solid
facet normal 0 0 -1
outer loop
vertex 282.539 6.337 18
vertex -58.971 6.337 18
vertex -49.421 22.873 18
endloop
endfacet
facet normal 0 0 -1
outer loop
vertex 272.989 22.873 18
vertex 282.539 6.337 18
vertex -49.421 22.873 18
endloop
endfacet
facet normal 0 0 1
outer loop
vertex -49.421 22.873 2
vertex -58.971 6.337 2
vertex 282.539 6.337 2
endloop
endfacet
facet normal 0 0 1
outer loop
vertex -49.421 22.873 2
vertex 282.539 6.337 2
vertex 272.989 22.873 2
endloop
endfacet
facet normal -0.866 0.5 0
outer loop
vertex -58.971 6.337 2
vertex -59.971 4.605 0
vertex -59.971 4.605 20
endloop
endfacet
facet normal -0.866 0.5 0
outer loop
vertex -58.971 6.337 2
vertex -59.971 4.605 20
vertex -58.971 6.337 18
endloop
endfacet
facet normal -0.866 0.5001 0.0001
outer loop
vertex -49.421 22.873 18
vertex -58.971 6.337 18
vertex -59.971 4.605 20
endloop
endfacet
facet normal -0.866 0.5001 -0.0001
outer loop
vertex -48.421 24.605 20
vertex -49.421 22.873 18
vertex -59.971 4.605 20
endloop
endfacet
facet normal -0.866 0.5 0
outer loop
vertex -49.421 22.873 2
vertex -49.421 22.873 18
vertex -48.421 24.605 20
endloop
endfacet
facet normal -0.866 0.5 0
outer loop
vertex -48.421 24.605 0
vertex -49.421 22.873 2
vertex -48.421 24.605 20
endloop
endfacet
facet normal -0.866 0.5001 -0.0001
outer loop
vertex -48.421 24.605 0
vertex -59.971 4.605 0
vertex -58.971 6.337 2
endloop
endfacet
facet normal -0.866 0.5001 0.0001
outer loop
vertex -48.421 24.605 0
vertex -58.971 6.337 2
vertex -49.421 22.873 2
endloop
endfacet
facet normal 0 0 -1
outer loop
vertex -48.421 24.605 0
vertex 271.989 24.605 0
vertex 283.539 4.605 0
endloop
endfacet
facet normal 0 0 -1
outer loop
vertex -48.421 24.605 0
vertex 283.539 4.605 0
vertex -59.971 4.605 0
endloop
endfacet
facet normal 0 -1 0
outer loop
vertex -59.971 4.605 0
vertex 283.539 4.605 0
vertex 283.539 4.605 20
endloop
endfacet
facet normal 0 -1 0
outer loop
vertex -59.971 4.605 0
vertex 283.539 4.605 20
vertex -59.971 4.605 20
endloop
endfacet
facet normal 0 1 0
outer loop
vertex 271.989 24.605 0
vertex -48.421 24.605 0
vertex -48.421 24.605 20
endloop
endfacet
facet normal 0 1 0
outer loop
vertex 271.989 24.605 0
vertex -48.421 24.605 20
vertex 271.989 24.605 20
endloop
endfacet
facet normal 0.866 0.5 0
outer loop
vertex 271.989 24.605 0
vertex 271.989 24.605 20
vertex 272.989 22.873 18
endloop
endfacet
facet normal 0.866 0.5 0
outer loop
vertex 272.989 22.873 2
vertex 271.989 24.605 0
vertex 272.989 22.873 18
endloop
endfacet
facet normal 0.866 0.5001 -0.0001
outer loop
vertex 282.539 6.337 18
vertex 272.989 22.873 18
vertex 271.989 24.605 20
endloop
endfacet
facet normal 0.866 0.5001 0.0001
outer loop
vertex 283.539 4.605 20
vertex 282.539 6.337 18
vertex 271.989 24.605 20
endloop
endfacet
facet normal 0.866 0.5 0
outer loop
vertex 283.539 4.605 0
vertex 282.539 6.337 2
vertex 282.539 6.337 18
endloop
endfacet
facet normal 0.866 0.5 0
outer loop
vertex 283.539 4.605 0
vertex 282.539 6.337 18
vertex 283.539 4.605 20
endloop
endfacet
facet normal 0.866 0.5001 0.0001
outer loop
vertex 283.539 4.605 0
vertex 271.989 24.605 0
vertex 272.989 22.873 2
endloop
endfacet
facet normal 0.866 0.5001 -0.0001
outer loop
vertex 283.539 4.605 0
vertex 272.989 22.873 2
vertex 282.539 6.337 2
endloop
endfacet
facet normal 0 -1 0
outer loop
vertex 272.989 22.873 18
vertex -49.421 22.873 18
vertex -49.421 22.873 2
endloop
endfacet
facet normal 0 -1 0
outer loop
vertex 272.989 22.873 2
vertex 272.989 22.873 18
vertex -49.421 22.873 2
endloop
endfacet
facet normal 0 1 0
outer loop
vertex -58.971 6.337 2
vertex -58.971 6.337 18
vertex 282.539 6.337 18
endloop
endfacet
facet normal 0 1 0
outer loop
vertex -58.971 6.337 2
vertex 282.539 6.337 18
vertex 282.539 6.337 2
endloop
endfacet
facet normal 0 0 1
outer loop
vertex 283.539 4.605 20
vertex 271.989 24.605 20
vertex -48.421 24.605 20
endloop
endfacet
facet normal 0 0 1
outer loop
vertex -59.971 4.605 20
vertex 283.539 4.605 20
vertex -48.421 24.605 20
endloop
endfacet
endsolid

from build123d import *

# Parameters (mm, degrees)
BOSS_EXTRUDE1_DEPTH     = 20
CUT_EXTRUDE1_DEPTH      = 286.306420625
CUT_EXTRUDE1_DEPTH_BACK = 286.306420625
SKETCH3_W               = 16
SKETCH3_H               = 16.536122988


with BuildPart() as part:
    # Sketch1 → Boss-Extrude1 (new body)
    with BuildSketch(Plane.XY):
        Polygon((-48.421052632, 24.605263158), (271.988947368, 24.605263158), (283.538947368, 4.605263158), (-59.971052632, 4.605263158), align=None)
    extrude(amount=BOSS_EXTRUDE1_DEPTH)

    # Sketch3 → Cut-Extrude1 (cut, two sides: drawn at the far end of the back side and taken through both)
    with BuildSketch(Plane(origin=(0, 0, 0), x_dir=(0, 0, -1), z_dir=(1, 0, 0)).offset(-CUT_EXTRUDE1_DEPTH_BACK)):
        with Locations((-10, 14.605263158)):
            Rectangle(SKETCH3_W, SKETCH3_H)
    extrude(amount=CUT_EXTRUDE1_DEPTH + CUT_EXTRUDE1_DEPTH_BACK, mode=Mode.SUBTRACT)


solid = part.part
